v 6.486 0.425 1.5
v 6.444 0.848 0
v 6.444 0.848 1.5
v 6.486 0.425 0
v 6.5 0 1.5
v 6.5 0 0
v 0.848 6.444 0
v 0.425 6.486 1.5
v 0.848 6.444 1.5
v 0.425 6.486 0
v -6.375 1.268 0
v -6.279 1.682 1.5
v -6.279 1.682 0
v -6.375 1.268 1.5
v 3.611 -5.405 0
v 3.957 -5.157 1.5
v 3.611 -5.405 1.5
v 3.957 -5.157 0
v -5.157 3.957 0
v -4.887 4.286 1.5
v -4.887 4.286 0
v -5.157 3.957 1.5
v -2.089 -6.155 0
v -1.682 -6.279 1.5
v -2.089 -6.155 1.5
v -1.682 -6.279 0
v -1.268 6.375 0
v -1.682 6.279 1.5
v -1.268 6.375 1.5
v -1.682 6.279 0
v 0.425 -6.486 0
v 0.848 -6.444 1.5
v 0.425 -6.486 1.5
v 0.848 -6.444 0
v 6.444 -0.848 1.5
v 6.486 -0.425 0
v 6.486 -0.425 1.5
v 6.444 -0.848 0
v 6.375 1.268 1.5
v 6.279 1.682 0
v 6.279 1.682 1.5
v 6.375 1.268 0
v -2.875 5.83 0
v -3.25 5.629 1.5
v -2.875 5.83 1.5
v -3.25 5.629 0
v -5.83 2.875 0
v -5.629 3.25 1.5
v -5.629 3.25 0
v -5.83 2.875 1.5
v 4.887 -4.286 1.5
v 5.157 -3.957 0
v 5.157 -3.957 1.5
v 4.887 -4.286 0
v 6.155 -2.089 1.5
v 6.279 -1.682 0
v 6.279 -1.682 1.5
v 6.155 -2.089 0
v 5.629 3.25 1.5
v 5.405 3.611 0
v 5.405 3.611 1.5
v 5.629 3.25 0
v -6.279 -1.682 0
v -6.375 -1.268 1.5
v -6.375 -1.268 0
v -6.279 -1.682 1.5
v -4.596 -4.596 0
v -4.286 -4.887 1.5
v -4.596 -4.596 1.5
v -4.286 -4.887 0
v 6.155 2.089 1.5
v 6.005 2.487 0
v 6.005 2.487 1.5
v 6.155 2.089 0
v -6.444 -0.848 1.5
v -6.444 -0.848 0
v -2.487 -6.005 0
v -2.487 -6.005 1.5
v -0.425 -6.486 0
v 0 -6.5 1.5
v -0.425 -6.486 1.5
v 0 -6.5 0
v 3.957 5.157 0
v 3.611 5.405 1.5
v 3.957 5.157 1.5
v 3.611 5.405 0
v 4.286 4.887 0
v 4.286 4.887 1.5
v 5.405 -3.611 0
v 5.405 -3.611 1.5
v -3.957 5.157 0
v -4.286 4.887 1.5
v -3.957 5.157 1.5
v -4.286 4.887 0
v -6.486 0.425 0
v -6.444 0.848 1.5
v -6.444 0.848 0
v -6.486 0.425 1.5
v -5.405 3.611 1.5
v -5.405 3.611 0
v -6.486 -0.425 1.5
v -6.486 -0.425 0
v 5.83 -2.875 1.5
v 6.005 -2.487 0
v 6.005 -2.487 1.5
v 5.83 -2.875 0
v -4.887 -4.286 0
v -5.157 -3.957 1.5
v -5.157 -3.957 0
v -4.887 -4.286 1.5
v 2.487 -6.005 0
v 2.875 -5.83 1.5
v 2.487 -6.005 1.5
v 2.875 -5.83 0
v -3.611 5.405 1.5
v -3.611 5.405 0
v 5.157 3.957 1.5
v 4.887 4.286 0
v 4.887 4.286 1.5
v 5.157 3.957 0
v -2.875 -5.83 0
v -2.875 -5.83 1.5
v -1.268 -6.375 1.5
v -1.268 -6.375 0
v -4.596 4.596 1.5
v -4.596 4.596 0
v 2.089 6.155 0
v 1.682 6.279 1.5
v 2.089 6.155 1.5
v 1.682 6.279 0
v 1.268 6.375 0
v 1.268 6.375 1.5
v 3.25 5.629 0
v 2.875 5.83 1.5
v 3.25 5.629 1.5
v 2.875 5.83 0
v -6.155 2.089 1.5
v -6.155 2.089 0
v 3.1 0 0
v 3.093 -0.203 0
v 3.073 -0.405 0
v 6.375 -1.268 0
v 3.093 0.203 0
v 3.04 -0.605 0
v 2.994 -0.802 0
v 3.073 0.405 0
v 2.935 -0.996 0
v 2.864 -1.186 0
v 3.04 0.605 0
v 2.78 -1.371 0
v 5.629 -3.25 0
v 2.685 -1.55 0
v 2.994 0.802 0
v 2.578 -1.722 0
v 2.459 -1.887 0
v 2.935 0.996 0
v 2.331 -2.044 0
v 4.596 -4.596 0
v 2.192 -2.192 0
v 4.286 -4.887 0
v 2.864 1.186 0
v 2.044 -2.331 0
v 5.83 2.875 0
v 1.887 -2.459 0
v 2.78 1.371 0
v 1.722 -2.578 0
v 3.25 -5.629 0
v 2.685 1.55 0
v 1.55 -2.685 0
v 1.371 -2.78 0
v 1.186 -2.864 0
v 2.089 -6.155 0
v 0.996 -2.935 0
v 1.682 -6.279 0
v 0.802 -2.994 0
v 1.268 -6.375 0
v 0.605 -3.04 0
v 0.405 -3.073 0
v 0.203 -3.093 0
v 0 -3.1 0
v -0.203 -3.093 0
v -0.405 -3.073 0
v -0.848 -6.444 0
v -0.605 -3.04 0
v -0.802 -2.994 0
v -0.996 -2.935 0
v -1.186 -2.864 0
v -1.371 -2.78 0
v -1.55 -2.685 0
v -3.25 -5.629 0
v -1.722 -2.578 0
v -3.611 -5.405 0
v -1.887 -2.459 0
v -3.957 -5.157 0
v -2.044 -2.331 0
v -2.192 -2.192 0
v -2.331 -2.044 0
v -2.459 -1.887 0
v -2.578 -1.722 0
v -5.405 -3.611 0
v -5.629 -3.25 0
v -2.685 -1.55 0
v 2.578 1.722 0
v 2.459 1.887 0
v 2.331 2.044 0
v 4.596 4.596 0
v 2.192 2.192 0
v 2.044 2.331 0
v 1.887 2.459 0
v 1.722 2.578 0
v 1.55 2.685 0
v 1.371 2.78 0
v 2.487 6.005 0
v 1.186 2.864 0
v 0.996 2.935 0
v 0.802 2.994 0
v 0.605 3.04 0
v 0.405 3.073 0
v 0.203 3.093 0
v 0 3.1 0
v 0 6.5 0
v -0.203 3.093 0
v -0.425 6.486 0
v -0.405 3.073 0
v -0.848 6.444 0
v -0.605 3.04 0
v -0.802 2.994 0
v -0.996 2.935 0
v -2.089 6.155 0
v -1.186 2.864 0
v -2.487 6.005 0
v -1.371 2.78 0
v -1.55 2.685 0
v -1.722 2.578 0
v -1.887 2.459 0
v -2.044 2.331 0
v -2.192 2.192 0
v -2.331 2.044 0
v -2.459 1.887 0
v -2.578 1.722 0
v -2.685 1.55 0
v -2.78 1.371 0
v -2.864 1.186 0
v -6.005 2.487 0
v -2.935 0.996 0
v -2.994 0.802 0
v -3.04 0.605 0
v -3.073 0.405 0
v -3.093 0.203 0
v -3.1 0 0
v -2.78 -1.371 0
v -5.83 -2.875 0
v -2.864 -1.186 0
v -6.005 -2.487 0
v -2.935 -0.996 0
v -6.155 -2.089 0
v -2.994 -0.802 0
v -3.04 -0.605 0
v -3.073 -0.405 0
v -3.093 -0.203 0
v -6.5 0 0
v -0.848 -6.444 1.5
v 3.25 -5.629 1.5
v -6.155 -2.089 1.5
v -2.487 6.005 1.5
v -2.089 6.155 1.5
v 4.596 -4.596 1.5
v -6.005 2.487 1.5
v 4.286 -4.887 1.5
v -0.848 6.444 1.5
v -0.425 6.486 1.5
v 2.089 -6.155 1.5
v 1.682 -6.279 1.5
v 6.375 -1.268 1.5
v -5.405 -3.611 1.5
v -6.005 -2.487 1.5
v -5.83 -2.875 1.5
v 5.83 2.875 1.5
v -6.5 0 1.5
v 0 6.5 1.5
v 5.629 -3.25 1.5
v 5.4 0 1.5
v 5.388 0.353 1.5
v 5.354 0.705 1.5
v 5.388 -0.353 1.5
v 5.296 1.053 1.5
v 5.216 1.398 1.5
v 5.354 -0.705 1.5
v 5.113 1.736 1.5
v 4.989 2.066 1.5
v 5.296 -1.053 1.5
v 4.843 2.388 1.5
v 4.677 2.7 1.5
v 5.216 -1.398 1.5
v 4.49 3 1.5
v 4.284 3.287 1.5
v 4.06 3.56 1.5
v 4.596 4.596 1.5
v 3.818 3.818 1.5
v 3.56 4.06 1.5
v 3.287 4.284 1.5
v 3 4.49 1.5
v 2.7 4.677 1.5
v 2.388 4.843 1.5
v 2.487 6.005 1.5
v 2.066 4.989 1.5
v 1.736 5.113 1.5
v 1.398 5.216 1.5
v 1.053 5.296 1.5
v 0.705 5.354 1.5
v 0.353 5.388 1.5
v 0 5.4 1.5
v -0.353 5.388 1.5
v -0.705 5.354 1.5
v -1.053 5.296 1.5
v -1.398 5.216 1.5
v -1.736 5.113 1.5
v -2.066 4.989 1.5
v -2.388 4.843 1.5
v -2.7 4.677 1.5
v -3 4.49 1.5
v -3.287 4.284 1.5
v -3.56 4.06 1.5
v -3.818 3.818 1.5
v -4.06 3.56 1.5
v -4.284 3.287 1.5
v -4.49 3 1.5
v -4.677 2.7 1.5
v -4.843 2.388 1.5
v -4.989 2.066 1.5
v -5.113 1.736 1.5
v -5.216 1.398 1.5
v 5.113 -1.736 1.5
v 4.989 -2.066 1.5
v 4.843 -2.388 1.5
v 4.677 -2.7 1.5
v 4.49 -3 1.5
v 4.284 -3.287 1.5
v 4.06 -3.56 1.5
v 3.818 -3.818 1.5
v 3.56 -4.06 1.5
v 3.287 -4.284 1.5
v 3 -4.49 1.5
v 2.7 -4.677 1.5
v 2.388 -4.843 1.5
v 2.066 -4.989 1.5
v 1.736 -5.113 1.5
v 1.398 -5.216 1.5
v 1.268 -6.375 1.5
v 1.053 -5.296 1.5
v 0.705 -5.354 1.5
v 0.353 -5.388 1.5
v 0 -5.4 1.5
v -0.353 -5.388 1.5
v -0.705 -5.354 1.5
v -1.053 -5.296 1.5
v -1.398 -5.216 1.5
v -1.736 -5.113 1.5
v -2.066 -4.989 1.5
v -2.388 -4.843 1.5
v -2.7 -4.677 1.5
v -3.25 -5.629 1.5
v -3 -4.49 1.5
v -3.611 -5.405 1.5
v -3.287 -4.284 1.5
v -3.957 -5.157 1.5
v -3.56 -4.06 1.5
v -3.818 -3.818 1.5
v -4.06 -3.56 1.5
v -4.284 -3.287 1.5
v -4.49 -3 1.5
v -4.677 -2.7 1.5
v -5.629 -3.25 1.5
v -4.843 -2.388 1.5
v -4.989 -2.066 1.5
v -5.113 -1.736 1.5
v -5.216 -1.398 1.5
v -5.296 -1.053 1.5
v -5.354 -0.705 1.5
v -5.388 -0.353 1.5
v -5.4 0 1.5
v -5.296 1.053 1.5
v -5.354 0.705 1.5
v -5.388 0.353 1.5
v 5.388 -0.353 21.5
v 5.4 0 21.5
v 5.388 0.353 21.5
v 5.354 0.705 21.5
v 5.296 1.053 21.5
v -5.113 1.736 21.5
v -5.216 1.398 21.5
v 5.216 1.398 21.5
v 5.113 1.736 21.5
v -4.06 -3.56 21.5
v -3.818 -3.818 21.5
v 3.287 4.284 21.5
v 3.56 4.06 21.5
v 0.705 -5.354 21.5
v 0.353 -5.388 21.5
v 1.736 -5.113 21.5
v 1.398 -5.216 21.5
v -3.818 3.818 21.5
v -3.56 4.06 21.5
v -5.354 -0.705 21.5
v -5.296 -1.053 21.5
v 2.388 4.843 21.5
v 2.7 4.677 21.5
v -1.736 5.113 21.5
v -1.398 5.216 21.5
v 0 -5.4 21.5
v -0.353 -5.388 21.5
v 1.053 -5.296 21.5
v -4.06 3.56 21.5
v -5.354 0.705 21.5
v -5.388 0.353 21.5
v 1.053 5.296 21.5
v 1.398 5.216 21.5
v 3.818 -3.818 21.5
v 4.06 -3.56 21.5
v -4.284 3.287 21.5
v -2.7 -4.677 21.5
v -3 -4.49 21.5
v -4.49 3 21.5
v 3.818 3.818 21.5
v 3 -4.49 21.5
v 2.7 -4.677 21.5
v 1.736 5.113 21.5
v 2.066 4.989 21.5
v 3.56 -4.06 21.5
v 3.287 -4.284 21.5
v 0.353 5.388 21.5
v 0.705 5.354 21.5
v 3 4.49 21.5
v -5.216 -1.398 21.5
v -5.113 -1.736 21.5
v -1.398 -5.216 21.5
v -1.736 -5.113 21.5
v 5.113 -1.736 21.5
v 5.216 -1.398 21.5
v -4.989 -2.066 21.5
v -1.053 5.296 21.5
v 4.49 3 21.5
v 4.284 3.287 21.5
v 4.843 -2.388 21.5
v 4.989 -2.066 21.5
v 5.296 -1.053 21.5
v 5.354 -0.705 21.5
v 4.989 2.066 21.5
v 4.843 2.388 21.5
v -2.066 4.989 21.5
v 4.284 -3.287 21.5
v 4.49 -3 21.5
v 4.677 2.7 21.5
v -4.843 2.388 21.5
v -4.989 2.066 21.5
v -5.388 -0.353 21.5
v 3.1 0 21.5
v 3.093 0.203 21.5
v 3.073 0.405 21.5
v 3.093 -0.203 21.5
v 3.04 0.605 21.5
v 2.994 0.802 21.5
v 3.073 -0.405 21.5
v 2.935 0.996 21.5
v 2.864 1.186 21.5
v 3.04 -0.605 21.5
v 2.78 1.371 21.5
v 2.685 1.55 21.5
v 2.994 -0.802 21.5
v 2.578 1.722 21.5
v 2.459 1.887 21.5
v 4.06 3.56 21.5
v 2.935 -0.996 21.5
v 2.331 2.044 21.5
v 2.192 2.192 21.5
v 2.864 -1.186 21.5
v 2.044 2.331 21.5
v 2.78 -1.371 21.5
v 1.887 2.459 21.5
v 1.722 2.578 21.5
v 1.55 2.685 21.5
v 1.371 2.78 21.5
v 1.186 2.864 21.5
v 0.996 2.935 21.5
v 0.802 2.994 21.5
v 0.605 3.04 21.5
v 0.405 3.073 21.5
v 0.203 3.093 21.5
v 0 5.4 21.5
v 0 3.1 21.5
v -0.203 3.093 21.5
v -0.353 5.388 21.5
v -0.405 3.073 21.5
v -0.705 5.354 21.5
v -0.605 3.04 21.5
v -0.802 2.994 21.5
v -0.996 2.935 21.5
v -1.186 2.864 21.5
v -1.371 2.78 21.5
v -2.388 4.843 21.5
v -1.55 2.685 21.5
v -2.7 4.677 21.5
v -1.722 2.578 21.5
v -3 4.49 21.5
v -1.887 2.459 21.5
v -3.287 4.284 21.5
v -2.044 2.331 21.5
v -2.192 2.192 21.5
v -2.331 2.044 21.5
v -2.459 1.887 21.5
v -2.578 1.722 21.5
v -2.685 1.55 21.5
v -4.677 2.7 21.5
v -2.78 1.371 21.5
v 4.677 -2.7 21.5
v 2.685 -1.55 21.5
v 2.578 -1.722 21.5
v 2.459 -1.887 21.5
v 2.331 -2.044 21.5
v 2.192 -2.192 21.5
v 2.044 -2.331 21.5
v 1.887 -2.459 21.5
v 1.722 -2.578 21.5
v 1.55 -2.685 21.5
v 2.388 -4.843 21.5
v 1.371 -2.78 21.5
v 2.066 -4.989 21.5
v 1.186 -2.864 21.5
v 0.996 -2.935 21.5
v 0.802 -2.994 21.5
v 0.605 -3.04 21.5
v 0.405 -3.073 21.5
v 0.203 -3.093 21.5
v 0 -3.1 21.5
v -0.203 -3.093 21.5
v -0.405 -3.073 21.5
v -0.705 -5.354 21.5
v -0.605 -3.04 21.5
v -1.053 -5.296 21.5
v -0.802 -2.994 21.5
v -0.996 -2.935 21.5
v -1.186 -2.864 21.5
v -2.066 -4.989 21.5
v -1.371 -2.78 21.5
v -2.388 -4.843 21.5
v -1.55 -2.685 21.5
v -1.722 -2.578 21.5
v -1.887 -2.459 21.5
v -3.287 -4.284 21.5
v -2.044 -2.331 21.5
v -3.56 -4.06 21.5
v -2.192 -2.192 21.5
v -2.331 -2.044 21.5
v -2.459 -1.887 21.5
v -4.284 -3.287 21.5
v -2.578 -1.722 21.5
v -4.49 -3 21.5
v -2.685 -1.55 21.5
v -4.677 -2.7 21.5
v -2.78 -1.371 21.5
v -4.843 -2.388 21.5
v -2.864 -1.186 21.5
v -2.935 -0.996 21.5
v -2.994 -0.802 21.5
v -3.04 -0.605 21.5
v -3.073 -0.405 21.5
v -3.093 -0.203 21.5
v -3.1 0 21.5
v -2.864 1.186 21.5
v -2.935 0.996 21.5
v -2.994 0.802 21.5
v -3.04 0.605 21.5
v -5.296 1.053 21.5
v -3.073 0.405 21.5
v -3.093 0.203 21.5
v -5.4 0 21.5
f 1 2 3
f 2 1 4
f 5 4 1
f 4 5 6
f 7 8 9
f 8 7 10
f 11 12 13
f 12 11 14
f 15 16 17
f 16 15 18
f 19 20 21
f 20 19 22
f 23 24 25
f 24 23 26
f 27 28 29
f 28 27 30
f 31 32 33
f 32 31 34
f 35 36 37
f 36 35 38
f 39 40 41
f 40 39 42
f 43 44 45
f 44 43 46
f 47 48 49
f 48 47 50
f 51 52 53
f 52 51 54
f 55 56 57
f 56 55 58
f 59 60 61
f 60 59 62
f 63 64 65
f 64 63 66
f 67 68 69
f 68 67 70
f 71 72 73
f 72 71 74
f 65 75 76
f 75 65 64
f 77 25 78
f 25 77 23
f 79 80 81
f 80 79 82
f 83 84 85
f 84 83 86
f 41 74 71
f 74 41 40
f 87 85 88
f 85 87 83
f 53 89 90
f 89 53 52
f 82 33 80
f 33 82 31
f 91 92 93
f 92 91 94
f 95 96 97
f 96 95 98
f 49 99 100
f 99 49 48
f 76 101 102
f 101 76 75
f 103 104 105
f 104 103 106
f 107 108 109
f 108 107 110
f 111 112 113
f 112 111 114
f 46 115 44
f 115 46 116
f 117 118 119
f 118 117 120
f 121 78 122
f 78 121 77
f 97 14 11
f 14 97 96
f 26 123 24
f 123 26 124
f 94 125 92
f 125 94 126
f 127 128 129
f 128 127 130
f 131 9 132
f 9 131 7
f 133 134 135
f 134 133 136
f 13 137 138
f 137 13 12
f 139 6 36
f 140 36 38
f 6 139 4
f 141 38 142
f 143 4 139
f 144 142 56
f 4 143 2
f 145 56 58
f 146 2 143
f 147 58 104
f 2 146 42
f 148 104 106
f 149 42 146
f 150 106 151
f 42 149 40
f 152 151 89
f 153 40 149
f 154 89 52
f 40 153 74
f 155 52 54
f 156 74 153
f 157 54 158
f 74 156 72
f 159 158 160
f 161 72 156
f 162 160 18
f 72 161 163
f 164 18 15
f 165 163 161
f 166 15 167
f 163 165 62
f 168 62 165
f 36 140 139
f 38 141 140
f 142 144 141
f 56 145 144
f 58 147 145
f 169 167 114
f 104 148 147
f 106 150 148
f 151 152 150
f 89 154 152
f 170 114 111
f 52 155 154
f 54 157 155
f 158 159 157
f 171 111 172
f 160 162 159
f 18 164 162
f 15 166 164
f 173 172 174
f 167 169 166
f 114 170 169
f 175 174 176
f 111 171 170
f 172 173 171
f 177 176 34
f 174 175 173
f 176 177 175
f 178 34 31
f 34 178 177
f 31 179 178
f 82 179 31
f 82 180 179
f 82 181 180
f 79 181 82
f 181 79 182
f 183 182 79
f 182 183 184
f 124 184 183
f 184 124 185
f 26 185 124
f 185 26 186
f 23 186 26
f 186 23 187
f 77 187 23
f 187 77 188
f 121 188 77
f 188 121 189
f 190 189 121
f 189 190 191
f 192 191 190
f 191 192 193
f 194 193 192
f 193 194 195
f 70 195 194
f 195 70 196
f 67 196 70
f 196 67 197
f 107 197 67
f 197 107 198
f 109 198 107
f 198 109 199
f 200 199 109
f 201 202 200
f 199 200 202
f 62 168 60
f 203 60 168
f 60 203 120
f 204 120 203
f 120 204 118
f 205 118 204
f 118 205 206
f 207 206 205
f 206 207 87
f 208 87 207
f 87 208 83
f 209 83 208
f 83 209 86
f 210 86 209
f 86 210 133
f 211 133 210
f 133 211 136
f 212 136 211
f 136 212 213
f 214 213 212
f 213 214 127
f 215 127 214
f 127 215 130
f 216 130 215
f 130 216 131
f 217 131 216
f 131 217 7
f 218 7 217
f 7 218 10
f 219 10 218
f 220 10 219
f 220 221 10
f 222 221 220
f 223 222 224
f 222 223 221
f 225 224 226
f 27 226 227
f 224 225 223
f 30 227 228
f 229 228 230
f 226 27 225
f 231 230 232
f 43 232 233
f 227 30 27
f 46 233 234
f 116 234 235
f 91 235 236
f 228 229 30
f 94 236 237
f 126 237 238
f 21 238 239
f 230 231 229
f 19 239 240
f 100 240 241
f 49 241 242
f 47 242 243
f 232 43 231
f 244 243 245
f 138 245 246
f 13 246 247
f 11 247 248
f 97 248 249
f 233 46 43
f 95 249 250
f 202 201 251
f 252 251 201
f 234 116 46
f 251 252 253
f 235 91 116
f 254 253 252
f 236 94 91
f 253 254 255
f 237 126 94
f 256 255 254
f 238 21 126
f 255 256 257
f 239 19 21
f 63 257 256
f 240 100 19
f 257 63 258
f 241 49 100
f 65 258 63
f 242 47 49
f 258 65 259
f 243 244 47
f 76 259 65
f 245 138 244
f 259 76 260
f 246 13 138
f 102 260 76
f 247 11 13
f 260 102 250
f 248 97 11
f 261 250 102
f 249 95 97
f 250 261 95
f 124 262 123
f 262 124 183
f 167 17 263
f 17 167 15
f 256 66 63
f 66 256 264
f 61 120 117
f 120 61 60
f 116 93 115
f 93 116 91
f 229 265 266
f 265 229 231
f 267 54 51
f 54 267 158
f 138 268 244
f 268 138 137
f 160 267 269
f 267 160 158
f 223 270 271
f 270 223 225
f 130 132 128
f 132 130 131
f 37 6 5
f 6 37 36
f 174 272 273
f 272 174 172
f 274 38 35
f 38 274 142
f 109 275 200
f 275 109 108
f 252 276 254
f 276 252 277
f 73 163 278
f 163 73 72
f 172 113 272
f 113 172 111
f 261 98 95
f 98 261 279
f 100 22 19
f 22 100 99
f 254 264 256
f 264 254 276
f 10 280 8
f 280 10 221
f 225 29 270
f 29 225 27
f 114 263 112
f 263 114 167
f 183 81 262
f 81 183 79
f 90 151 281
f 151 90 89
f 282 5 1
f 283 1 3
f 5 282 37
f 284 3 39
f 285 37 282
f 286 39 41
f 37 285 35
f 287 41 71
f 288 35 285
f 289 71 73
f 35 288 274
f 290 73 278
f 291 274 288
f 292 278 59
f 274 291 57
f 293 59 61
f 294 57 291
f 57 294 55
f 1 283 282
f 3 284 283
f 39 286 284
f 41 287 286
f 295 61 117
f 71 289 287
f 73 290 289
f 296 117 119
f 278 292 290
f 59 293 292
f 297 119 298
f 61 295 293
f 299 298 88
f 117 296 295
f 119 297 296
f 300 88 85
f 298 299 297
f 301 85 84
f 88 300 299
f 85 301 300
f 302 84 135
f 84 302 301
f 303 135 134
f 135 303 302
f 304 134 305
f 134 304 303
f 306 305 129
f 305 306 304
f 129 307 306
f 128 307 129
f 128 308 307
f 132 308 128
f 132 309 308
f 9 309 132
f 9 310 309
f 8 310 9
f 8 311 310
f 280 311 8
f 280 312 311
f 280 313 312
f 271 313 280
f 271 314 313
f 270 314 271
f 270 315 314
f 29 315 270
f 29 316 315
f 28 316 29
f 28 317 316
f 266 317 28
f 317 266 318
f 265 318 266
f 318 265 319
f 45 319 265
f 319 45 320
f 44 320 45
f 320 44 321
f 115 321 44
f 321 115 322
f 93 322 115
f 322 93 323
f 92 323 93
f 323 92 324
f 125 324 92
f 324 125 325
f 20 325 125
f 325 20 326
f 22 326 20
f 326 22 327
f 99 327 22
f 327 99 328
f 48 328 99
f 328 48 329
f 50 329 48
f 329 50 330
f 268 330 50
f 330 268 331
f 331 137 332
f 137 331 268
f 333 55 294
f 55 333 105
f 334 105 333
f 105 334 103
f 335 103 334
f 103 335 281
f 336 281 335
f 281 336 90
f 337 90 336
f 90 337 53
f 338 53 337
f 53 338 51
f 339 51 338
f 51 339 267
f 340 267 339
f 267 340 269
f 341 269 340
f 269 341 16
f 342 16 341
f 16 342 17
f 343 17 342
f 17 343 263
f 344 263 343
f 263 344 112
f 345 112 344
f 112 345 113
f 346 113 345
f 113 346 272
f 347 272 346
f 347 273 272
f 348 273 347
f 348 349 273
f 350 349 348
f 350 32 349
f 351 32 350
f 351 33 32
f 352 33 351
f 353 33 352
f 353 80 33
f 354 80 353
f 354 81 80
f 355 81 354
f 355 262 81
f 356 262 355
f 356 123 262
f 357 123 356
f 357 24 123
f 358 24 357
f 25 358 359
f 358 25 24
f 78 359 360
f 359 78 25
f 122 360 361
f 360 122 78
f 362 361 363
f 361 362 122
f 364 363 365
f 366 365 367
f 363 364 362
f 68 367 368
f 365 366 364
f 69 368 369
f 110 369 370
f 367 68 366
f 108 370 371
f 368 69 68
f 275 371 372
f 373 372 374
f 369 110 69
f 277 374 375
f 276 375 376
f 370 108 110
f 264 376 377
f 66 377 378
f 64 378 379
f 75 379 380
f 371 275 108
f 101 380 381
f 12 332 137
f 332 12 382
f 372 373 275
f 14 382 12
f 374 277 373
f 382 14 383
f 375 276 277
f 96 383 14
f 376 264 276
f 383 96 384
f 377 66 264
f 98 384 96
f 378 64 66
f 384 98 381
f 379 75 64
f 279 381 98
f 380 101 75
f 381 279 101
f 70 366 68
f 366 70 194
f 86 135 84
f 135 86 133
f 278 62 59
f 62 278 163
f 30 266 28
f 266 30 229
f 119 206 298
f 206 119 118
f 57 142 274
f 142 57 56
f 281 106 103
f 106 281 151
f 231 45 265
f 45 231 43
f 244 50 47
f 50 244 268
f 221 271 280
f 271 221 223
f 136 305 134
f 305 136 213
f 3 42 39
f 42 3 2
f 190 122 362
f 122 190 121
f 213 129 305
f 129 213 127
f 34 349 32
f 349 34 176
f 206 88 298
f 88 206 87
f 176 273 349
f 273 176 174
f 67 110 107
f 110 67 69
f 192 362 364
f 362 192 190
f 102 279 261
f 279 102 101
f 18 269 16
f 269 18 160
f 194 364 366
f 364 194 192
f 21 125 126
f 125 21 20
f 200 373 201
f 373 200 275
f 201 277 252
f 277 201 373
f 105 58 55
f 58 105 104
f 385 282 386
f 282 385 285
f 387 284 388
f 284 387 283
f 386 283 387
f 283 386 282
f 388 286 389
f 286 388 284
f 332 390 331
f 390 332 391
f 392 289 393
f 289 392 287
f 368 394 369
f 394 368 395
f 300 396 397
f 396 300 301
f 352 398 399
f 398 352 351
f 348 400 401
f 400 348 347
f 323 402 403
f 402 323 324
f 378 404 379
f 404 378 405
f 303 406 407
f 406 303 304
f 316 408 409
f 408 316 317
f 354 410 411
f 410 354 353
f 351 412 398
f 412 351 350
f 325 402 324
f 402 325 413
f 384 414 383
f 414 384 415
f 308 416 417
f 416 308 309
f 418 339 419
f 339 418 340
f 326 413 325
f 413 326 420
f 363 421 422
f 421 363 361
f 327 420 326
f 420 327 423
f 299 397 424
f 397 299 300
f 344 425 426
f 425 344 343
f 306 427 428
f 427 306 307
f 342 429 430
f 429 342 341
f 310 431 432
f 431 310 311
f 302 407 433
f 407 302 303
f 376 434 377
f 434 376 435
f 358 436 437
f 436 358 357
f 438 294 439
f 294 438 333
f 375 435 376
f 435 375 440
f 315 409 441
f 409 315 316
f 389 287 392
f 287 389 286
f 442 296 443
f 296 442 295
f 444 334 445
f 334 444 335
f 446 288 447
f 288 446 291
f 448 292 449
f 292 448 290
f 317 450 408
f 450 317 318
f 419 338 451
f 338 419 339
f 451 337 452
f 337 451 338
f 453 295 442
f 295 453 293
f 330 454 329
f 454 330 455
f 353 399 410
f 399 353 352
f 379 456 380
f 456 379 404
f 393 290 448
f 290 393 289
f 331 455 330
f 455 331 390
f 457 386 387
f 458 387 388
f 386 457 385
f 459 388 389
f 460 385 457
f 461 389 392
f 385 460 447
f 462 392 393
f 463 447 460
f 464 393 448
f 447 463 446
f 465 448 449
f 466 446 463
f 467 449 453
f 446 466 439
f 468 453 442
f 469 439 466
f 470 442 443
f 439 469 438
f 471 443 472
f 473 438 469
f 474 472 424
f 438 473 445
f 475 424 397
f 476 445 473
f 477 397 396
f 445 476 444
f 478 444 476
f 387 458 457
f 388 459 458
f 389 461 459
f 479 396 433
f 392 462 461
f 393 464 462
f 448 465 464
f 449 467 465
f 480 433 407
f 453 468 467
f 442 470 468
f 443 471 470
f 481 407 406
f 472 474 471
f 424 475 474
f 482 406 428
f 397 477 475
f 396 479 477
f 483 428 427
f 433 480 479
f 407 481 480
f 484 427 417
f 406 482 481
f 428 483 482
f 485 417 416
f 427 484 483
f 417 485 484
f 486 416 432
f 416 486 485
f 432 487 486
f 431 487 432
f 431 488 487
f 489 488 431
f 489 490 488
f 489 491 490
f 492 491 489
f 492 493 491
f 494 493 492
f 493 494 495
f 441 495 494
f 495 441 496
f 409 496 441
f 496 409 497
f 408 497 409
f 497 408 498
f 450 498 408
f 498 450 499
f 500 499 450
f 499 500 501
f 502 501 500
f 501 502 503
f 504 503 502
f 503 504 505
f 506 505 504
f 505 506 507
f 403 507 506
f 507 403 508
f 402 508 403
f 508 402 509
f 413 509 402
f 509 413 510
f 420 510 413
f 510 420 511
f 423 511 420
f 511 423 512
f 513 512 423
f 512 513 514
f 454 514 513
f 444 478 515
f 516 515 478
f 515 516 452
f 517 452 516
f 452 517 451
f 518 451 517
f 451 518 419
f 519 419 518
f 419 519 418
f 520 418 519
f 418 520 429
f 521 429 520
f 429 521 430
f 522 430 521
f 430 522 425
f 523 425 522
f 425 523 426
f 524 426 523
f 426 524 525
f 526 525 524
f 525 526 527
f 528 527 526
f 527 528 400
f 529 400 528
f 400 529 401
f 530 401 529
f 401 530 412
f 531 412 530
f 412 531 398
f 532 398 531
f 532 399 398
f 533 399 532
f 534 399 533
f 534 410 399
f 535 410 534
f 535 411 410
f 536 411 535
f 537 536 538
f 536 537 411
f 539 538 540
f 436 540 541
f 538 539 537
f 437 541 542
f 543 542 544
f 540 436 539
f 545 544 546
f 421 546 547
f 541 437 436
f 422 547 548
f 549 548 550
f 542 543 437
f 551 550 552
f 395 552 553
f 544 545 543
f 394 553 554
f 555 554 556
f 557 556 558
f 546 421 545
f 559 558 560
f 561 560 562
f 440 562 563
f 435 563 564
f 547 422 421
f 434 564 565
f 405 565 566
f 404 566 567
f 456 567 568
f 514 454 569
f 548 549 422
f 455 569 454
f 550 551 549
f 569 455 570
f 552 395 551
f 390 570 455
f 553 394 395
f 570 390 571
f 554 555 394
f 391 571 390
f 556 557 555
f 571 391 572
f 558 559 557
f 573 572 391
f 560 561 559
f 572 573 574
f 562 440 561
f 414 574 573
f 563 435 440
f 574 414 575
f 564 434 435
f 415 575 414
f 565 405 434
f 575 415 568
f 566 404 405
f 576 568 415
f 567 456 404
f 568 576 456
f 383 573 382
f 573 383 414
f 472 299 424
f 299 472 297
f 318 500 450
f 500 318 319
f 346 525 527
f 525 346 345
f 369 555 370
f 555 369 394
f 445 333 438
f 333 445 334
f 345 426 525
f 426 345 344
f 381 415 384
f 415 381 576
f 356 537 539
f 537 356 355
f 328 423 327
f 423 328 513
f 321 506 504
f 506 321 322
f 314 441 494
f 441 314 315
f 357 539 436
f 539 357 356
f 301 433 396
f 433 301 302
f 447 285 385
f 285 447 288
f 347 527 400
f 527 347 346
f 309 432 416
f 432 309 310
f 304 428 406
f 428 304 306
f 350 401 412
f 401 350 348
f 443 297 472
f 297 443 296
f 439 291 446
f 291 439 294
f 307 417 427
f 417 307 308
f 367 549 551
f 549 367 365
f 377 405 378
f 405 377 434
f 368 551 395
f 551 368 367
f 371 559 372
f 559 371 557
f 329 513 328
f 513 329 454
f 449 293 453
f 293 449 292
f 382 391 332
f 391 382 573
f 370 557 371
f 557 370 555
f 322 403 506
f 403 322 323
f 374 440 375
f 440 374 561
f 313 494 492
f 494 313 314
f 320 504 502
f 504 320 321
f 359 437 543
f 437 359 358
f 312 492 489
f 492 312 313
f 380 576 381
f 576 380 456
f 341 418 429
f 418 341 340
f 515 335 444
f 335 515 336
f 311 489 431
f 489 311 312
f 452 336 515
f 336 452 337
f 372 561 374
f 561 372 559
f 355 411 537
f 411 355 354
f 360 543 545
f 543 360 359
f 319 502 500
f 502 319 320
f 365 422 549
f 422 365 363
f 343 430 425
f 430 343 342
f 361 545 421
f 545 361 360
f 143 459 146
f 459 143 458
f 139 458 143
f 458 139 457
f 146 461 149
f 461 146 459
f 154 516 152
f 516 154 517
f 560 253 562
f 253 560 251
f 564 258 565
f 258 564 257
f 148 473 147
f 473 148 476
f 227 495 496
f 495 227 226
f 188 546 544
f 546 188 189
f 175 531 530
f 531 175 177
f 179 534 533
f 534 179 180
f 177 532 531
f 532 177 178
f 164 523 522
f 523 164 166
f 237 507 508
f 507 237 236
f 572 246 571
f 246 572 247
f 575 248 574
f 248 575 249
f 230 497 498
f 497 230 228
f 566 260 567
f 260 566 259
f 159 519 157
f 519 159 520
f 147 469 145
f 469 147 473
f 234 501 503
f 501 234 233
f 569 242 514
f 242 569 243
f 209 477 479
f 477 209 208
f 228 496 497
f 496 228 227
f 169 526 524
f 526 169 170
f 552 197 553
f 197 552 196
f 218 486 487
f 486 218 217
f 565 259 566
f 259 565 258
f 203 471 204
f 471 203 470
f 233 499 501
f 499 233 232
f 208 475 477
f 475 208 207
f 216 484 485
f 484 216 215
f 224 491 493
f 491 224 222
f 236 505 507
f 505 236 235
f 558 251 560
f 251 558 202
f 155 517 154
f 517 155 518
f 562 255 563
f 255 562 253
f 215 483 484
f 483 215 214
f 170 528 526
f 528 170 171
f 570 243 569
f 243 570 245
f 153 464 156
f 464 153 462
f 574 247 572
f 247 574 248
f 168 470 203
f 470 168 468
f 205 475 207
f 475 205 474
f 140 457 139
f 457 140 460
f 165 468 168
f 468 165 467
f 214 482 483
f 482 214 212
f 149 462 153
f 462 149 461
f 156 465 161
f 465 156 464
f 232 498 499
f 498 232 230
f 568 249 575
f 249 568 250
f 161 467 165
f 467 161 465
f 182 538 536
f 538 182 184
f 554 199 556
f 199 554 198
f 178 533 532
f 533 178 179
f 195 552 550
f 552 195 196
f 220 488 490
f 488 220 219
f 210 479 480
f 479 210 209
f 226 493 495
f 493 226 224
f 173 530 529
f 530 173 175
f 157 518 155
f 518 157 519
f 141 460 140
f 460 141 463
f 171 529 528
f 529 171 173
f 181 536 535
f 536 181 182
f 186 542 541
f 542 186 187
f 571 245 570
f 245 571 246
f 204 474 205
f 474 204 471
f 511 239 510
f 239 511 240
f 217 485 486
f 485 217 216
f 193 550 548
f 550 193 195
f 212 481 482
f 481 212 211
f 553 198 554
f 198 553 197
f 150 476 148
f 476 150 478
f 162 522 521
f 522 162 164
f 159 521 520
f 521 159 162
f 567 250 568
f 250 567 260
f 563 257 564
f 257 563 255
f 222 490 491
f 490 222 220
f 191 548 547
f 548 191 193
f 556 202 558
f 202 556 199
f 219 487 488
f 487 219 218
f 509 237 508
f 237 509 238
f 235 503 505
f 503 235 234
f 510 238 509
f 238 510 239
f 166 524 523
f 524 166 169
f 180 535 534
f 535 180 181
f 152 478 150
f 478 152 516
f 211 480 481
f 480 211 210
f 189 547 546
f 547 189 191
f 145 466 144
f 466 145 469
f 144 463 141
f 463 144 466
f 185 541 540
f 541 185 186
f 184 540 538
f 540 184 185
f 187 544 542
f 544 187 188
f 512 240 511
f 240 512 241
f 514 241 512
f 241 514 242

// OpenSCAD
// Adapter sleeve: 0.2 mL PCR tube in a 1.5 mL rack hole
// Print orientation: collar down on the bed (z = 0), sleeve up (+Z)

$fn = 96;

// ---- Dimensions (mm) ----
collar_d      = 13;    // collar outer diameter
collar_h      = 1.5;   // collar thickness (z = 0 to 1.5)
sleeve_od     = 10.8;  // sleeve body outer diameter
sleeve_top_z  = 21.5;  // top of sleeve body
bore_d        = 6.2;   // through-bore diameter
eps           = 0.5;   // cutter overshoot past faces

// ---- Model ----
difference() {
    union() {
        // Collar
        cylinder(d = collar_d, h = collar_h);
        // Sleeve body (overlaps collar slightly for a clean union)
        translate([0, 0, collar_h - 0.01])
            cylinder(d = sleeve_od, h = sleeve_top_z - collar_h + 0.01);
    }
    // Full-height bore, open at both ends
    translate([0, 0, -eps])
        cylinder(d = bore_d, h = sleeve_top_z + 2 * eps);
}
